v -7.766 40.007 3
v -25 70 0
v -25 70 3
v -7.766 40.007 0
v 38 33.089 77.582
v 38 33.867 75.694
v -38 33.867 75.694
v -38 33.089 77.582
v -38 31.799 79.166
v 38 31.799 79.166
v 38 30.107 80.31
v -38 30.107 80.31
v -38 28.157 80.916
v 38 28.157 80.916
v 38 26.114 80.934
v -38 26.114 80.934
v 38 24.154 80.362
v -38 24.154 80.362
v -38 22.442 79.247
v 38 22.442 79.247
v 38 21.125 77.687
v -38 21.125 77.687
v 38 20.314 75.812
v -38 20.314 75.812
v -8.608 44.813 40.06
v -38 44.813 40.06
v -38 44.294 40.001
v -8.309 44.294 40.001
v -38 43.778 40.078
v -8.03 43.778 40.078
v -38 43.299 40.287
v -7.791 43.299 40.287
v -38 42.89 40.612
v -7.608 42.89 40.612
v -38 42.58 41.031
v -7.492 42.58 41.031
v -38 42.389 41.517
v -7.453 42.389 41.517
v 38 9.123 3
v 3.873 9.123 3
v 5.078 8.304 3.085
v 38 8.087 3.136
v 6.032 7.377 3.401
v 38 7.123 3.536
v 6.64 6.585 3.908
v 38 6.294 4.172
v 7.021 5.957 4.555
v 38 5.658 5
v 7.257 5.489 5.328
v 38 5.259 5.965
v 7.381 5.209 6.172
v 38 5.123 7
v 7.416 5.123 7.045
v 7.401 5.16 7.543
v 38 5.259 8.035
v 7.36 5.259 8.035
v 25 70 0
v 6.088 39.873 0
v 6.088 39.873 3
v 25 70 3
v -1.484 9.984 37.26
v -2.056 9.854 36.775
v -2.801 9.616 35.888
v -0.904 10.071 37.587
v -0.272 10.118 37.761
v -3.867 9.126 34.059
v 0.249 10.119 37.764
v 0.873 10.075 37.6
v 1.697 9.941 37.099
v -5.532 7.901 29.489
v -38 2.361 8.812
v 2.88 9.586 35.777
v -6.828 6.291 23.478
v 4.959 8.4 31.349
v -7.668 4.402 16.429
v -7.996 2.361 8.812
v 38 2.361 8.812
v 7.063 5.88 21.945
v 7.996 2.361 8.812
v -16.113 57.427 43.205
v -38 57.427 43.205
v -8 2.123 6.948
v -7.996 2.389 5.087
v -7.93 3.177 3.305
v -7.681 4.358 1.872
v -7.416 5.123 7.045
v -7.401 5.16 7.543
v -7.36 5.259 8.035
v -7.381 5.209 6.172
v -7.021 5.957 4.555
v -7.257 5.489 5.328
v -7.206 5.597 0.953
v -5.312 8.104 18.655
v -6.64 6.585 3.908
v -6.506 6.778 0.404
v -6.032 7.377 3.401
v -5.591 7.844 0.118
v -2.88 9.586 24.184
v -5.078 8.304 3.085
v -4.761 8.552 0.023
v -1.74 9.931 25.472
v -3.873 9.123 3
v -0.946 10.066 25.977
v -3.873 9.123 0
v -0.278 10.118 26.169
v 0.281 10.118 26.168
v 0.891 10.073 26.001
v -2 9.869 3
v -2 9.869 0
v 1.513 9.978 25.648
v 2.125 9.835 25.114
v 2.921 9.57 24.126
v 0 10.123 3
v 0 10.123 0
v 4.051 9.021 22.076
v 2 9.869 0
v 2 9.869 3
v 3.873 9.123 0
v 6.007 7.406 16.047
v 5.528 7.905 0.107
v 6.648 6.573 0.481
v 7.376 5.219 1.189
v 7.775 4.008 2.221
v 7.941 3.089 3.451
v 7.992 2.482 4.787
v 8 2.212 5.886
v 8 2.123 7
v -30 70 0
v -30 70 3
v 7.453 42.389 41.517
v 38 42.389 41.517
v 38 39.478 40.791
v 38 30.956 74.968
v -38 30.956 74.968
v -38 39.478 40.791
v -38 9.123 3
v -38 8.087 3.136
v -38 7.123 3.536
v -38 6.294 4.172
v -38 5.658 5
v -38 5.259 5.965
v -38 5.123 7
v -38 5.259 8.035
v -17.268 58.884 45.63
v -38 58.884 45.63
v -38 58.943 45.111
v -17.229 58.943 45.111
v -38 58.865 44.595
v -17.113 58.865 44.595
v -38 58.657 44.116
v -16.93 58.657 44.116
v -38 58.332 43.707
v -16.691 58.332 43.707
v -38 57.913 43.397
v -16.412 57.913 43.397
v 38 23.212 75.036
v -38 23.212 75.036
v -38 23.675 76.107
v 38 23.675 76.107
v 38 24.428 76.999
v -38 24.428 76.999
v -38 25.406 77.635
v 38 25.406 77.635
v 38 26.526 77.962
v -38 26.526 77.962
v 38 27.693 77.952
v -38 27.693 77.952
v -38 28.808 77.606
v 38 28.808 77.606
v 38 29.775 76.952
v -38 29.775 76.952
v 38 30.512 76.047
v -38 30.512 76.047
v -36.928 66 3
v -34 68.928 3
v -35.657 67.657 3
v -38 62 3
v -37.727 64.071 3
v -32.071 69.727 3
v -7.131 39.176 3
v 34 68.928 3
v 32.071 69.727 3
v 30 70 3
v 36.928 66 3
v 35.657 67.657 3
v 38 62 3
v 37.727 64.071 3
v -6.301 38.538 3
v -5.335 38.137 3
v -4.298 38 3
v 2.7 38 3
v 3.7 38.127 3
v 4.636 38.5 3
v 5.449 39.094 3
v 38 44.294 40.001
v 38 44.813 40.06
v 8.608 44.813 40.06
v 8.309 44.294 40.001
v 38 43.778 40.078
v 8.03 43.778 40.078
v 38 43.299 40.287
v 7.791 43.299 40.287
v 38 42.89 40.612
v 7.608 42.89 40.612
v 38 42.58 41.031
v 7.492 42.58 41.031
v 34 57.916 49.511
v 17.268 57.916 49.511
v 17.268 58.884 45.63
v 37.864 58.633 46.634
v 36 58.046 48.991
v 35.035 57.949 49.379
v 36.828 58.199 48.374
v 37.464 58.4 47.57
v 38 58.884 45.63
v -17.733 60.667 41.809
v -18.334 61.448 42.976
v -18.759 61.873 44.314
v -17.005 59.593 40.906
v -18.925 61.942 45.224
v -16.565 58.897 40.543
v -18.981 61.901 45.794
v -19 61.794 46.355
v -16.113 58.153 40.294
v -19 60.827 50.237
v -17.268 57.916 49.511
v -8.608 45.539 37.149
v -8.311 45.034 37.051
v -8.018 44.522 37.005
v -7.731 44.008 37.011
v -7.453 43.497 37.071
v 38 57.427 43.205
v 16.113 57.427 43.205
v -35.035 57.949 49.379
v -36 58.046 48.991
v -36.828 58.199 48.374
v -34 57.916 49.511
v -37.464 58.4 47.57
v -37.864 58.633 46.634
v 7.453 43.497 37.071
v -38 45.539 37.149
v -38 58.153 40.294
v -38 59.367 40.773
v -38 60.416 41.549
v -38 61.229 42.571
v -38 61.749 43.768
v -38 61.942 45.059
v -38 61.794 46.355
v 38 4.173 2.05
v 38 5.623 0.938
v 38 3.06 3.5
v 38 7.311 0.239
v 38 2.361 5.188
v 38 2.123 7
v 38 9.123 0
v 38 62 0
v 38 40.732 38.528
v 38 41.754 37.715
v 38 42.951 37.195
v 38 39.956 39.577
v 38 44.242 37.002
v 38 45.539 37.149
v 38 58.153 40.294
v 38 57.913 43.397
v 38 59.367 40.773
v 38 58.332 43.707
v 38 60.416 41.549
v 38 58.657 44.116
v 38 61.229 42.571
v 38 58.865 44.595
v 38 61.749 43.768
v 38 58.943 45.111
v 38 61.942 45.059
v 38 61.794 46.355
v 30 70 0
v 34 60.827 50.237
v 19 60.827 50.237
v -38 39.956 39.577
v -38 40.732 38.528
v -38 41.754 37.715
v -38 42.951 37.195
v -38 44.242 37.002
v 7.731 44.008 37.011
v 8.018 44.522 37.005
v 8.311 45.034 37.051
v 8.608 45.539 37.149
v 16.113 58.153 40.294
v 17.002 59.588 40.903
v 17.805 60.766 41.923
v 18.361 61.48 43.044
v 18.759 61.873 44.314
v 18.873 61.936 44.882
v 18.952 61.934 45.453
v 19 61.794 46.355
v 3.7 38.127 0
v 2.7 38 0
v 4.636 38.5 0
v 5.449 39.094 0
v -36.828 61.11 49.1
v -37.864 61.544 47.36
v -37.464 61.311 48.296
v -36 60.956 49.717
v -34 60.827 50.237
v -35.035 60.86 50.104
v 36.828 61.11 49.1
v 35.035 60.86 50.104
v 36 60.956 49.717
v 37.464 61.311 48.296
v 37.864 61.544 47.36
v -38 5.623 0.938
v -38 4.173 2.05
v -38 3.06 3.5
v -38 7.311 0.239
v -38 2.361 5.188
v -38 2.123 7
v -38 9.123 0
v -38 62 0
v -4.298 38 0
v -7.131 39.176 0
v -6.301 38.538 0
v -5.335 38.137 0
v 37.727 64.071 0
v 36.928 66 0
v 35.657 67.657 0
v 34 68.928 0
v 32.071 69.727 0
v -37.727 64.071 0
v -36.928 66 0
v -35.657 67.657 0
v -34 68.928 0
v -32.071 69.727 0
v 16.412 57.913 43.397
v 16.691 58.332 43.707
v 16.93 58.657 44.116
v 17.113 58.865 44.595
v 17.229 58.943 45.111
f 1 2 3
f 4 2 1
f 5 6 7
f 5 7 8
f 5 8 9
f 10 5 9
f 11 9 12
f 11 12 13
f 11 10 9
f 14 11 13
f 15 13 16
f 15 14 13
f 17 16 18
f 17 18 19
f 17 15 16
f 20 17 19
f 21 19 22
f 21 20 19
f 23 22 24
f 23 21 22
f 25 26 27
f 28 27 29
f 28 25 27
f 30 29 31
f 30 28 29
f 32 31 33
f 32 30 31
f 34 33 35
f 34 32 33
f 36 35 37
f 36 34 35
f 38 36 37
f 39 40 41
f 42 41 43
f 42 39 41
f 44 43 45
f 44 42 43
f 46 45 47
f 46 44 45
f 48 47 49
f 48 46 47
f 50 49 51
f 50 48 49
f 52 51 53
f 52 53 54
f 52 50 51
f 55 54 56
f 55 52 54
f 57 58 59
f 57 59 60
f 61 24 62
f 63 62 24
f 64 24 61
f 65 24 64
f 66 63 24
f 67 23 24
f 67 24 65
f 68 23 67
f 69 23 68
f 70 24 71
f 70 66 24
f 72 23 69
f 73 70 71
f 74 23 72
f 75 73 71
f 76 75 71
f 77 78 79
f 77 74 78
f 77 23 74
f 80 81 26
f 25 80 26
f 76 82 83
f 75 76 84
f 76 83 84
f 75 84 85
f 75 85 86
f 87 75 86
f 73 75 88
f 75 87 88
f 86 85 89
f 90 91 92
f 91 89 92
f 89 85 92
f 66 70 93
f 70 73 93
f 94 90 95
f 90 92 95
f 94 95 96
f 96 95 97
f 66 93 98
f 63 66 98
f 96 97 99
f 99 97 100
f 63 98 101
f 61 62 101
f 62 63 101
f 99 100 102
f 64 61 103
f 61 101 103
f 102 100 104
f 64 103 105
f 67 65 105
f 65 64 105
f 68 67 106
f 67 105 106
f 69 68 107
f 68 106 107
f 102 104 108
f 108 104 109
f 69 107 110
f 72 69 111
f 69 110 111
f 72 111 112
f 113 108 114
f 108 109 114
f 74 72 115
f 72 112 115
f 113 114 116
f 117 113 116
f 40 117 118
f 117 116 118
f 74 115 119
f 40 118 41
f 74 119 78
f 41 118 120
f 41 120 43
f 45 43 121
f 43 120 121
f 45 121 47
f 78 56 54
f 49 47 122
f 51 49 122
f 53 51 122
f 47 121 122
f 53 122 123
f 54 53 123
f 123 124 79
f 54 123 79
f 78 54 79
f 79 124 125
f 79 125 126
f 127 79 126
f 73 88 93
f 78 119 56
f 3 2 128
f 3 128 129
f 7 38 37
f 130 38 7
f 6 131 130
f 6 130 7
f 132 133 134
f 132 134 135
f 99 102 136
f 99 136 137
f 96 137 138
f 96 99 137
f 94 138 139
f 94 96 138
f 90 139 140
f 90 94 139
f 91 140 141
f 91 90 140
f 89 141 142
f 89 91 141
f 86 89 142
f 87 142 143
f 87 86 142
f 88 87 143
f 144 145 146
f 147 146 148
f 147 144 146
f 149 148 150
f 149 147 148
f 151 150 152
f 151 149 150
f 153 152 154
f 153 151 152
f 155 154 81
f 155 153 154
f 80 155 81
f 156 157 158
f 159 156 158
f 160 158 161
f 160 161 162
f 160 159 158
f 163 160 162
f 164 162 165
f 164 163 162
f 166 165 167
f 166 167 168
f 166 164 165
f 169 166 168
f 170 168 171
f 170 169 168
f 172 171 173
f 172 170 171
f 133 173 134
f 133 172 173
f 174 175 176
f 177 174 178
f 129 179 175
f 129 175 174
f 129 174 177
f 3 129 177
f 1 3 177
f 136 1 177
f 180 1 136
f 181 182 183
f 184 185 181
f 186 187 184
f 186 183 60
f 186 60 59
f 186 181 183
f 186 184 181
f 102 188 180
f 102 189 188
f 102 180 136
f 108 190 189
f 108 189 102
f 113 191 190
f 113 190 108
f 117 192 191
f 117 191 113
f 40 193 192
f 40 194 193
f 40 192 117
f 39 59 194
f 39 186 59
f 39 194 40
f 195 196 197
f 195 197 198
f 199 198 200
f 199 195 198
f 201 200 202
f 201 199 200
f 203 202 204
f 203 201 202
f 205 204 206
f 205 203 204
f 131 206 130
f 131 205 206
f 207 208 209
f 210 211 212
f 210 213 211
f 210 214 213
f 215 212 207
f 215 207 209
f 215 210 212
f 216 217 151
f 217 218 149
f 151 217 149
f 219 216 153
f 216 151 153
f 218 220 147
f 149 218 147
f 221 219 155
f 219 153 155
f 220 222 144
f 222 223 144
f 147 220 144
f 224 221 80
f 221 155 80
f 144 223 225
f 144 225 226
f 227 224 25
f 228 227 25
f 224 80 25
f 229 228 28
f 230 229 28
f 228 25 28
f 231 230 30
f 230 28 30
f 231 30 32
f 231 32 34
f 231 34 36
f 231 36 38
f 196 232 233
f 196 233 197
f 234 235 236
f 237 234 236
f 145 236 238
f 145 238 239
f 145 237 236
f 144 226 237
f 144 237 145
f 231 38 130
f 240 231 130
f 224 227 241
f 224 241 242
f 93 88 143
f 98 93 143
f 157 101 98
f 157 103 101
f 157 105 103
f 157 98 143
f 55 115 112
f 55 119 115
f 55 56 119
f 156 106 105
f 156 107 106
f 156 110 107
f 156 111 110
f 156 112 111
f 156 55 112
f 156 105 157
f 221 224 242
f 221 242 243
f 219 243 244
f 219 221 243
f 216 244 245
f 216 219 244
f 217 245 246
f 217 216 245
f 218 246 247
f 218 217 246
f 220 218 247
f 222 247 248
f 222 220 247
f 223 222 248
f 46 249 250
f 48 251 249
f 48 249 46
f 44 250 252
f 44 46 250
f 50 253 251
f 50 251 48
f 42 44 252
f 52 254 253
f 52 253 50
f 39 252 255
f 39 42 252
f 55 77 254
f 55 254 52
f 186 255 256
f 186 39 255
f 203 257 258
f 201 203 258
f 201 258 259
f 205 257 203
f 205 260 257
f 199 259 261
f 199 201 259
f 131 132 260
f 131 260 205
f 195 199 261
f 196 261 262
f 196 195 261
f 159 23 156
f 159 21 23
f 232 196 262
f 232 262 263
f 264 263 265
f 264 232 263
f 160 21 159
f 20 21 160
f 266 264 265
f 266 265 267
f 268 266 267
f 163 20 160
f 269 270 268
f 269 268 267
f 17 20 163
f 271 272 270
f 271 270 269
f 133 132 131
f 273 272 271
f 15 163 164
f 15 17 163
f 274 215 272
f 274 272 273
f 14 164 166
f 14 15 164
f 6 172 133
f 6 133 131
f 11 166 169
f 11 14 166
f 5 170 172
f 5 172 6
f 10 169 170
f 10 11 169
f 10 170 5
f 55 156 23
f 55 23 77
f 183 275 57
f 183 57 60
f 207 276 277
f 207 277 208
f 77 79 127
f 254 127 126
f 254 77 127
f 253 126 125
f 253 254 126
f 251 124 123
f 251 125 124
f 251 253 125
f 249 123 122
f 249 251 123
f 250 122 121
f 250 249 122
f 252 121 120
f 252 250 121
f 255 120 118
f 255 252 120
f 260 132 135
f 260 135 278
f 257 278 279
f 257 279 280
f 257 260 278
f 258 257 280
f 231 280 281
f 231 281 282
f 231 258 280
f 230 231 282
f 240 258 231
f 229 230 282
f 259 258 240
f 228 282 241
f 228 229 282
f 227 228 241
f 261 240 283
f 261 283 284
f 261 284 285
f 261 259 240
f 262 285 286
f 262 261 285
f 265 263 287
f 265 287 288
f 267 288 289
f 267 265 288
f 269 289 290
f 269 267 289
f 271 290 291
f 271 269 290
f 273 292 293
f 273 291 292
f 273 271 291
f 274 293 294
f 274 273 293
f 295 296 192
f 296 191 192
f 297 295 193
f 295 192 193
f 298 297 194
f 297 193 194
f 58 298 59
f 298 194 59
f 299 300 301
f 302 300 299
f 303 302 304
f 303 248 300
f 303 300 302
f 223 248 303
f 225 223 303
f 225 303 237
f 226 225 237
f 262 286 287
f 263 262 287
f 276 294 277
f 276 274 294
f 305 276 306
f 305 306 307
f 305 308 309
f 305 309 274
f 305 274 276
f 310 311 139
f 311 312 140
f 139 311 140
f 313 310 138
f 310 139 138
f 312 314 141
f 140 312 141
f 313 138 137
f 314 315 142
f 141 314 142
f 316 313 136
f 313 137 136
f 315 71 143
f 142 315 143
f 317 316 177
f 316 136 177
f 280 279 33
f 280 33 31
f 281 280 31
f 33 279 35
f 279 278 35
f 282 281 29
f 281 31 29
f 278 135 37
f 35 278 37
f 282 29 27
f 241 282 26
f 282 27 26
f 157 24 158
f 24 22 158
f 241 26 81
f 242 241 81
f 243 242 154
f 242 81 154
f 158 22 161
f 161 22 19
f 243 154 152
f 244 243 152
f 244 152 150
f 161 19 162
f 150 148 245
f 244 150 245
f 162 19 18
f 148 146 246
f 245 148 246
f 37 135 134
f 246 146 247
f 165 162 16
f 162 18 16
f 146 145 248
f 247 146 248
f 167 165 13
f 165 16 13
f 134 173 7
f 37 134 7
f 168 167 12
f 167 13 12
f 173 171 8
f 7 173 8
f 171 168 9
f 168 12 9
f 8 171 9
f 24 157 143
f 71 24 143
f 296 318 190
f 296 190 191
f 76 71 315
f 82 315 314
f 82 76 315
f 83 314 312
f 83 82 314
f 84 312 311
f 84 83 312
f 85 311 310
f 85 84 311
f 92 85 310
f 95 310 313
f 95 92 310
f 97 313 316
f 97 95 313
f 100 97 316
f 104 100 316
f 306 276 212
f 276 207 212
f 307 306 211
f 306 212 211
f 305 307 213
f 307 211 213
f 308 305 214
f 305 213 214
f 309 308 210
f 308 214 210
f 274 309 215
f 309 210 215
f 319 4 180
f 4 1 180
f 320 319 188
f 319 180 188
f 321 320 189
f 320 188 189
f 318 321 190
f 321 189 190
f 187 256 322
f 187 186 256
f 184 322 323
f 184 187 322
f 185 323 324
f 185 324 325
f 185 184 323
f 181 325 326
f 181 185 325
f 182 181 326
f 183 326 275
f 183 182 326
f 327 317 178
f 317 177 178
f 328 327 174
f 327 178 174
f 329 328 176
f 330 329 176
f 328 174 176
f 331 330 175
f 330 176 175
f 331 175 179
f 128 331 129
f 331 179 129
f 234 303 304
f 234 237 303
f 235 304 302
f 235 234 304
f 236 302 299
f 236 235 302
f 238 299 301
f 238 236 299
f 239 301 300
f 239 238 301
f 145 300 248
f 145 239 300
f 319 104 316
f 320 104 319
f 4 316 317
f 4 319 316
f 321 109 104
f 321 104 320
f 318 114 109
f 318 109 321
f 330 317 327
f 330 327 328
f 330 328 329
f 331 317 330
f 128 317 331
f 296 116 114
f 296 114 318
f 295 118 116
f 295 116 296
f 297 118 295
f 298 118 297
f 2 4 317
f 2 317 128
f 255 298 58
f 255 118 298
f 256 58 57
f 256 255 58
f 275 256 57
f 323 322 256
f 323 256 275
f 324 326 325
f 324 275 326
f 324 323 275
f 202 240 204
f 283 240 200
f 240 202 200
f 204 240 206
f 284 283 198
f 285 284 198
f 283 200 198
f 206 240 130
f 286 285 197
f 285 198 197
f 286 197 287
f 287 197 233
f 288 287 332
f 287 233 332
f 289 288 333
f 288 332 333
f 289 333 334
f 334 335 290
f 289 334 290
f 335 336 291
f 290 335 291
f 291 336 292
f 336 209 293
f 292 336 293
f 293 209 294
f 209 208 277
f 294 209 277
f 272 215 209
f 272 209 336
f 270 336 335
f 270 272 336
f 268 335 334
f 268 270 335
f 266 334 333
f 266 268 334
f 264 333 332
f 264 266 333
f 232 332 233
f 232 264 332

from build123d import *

# Parameters (mm, degrees)
BOSS_EXTRUDE1_DEPTH     = 38
FILLET1_R               = 4
FILLET2_R               = 8
CUT_EXTRUDE1_DEPTH      = 1
CUT_EXTRUDE1_DEPTH_BACK = 13
FILLET3_R               = 4
SKETCH4_R               = 8
CUT_EXTRUDE4_DEPTH      = 82.000266539
CUT_EXTRUDE5_DEPTH      = 51.051633202
CUT_EXTRUDE5_DEPTH_BACK = 45.963614062


with BuildPart() as part:
    # Sketch1 → Boss-Extrude1 (new body, symmetric)
    with BuildSketch(Plane.YZ):
        with BuildLine():
            Line((9.12257761, 0), (70, 0))
            Line((70, 0), (70, 3))
            Line((70, 3), (9.12257761, 3))
            ThreePointArc((9.12257761, 3), (5.949164249, 4.564954284), (5.258874305, 8.03527618))
            Line((5.258874305, 8.03527618), (23.211541616, 75.035542719))
            ThreePointArc((23.211541616, 75.035542719), (27.110151064, 78.000114231), (30.956427827, 74.967954121))
            Line((30.956427827, 74.967954121), (39.477634655, 40.791260242))
            ThreePointArc((39.477634655, 40.791260242), (41.753922912, 37.715033217), (45.538722765, 37.149391089))
            Line((45.538722765, 37.149391089), (58.152567206, 40.294375732))
            ThreePointArc((58.152567206, 40.294375732), (61.228794232, 42.570663989), (61.79443636, 46.355463841))
            Line((61.79443636, 46.355463841), (60.826748777, 50.236646746))
            Line((60.826748777, 50.236646746), (57.915861598, 49.510881059))
            Line((57.915861598, 49.510881059), (58.883549181, 45.629698154))
            ThreePointArc((58.883549181, 45.629698154), (58.65729233, 44.115778213), (57.426801519, 43.205262911))
            Line((57.426801519, 43.205262911), (44.812957078, 40.060278268))
            ThreePointArc((44.812957078, 40.060278268), (43.299037137, 40.286535119), (42.388521834, 41.517025929))
            Line((42.388521834, 41.517025929), (33.867315005, 75.693719808))
            ThreePointArc((33.867315005, 75.693719808), (27.13633067, 81), (20.313764138, 75.811999854))
            Line((20.313764138, 75.811999854), (2.361096826, 8.811733316))
            ThreePointArc((2.361096826, 8.811733316), (3.569104228, 2.738669997), (9.12257761, 0))
        make_face()
    extrude(amount=BOSS_EXTRUDE1_DEPTH, both=True)

    # Fillet1
    fillet1_edges = [part.edges().sort_by_distance(p)[0] for p in [
        (-38, 59.371305188, 49.873763903),
        (38, 59.371305188, 49.873763903),
    ]]
    fillet(fillet1_edges, radius=FILLET1_R)

    # Fillet2
    fillet2_edges = [part.edges().sort_by_distance(p)[0] for p in [
        (-38, 70, 1.5),
        (38, 70, 1.5),
    ]]
    fillet(fillet2_edges, radius=FILLET2_R)

    # Sketch2 → Cut-Extrude1 (cut, two sides)
    with BuildSketch(Plane(origin=(0, 0, 0), x_dir=(1, 0, 0), z_dir=(0, 0, -1))) as cut_extrude1_sk:
        Polygon((-25, -70), (-6.612779769, -38), (4.912194323, -38), (25, -70), align=None)
    extrude(amount=CUT_EXTRUDE1_DEPTH, mode=Mode.SUBTRACT)
    extrude(cut_extrude1_sk.sketch, amount=-CUT_EXTRUDE1_DEPTH_BACK, mode=Mode.SUBTRACT)

    # Fillet3
    fillet3_edges = [part.edges().sort_by_distance(p)[0] for p in [
        (4.912194323, 38, 1.5),
        (-6.612779769, 38, 1.5),
    ]]
    fillet(fillet3_edges, radius=FILLET3_R)

    # Sketch4 → Cut-Extrude4 (cut, through all)
    with BuildSketch(Plane(origin=(0, 0, 0), x_dir=(1, 0, 0), z_dir=(0, 0, -1))):
        with Locations((0, -2.12257761)):
            Circle(SKETCH4_R)
    extrude(amount=-CUT_EXTRUDE4_DEPTH, mode=Mode.SUBTRACT)

    # Sketch6 → Cut-Extrude5 (cut, two sides)
    with BuildSketch(Plane(origin=(0, -6.780848473, 27.196497771), x_dir=(1, 0, 0), z_dir=(0, -0.241921896, 0.970295726))) as cut_extrude5_sk:
        Polygon((-19, 71.173279191), (-7.452994616, 51.173279191), (7.452994616, 51.173279191), (19, 71.173279191), align=None)
    extrude(amount=CUT_EXTRUDE5_DEPTH, mode=Mode.SUBTRACT)
    extrude(cut_extrude5_sk.sketch, amount=-CUT_EXTRUDE5_DEPTH_BACK, mode=Mode.SUBTRACT)


solid = part.part
